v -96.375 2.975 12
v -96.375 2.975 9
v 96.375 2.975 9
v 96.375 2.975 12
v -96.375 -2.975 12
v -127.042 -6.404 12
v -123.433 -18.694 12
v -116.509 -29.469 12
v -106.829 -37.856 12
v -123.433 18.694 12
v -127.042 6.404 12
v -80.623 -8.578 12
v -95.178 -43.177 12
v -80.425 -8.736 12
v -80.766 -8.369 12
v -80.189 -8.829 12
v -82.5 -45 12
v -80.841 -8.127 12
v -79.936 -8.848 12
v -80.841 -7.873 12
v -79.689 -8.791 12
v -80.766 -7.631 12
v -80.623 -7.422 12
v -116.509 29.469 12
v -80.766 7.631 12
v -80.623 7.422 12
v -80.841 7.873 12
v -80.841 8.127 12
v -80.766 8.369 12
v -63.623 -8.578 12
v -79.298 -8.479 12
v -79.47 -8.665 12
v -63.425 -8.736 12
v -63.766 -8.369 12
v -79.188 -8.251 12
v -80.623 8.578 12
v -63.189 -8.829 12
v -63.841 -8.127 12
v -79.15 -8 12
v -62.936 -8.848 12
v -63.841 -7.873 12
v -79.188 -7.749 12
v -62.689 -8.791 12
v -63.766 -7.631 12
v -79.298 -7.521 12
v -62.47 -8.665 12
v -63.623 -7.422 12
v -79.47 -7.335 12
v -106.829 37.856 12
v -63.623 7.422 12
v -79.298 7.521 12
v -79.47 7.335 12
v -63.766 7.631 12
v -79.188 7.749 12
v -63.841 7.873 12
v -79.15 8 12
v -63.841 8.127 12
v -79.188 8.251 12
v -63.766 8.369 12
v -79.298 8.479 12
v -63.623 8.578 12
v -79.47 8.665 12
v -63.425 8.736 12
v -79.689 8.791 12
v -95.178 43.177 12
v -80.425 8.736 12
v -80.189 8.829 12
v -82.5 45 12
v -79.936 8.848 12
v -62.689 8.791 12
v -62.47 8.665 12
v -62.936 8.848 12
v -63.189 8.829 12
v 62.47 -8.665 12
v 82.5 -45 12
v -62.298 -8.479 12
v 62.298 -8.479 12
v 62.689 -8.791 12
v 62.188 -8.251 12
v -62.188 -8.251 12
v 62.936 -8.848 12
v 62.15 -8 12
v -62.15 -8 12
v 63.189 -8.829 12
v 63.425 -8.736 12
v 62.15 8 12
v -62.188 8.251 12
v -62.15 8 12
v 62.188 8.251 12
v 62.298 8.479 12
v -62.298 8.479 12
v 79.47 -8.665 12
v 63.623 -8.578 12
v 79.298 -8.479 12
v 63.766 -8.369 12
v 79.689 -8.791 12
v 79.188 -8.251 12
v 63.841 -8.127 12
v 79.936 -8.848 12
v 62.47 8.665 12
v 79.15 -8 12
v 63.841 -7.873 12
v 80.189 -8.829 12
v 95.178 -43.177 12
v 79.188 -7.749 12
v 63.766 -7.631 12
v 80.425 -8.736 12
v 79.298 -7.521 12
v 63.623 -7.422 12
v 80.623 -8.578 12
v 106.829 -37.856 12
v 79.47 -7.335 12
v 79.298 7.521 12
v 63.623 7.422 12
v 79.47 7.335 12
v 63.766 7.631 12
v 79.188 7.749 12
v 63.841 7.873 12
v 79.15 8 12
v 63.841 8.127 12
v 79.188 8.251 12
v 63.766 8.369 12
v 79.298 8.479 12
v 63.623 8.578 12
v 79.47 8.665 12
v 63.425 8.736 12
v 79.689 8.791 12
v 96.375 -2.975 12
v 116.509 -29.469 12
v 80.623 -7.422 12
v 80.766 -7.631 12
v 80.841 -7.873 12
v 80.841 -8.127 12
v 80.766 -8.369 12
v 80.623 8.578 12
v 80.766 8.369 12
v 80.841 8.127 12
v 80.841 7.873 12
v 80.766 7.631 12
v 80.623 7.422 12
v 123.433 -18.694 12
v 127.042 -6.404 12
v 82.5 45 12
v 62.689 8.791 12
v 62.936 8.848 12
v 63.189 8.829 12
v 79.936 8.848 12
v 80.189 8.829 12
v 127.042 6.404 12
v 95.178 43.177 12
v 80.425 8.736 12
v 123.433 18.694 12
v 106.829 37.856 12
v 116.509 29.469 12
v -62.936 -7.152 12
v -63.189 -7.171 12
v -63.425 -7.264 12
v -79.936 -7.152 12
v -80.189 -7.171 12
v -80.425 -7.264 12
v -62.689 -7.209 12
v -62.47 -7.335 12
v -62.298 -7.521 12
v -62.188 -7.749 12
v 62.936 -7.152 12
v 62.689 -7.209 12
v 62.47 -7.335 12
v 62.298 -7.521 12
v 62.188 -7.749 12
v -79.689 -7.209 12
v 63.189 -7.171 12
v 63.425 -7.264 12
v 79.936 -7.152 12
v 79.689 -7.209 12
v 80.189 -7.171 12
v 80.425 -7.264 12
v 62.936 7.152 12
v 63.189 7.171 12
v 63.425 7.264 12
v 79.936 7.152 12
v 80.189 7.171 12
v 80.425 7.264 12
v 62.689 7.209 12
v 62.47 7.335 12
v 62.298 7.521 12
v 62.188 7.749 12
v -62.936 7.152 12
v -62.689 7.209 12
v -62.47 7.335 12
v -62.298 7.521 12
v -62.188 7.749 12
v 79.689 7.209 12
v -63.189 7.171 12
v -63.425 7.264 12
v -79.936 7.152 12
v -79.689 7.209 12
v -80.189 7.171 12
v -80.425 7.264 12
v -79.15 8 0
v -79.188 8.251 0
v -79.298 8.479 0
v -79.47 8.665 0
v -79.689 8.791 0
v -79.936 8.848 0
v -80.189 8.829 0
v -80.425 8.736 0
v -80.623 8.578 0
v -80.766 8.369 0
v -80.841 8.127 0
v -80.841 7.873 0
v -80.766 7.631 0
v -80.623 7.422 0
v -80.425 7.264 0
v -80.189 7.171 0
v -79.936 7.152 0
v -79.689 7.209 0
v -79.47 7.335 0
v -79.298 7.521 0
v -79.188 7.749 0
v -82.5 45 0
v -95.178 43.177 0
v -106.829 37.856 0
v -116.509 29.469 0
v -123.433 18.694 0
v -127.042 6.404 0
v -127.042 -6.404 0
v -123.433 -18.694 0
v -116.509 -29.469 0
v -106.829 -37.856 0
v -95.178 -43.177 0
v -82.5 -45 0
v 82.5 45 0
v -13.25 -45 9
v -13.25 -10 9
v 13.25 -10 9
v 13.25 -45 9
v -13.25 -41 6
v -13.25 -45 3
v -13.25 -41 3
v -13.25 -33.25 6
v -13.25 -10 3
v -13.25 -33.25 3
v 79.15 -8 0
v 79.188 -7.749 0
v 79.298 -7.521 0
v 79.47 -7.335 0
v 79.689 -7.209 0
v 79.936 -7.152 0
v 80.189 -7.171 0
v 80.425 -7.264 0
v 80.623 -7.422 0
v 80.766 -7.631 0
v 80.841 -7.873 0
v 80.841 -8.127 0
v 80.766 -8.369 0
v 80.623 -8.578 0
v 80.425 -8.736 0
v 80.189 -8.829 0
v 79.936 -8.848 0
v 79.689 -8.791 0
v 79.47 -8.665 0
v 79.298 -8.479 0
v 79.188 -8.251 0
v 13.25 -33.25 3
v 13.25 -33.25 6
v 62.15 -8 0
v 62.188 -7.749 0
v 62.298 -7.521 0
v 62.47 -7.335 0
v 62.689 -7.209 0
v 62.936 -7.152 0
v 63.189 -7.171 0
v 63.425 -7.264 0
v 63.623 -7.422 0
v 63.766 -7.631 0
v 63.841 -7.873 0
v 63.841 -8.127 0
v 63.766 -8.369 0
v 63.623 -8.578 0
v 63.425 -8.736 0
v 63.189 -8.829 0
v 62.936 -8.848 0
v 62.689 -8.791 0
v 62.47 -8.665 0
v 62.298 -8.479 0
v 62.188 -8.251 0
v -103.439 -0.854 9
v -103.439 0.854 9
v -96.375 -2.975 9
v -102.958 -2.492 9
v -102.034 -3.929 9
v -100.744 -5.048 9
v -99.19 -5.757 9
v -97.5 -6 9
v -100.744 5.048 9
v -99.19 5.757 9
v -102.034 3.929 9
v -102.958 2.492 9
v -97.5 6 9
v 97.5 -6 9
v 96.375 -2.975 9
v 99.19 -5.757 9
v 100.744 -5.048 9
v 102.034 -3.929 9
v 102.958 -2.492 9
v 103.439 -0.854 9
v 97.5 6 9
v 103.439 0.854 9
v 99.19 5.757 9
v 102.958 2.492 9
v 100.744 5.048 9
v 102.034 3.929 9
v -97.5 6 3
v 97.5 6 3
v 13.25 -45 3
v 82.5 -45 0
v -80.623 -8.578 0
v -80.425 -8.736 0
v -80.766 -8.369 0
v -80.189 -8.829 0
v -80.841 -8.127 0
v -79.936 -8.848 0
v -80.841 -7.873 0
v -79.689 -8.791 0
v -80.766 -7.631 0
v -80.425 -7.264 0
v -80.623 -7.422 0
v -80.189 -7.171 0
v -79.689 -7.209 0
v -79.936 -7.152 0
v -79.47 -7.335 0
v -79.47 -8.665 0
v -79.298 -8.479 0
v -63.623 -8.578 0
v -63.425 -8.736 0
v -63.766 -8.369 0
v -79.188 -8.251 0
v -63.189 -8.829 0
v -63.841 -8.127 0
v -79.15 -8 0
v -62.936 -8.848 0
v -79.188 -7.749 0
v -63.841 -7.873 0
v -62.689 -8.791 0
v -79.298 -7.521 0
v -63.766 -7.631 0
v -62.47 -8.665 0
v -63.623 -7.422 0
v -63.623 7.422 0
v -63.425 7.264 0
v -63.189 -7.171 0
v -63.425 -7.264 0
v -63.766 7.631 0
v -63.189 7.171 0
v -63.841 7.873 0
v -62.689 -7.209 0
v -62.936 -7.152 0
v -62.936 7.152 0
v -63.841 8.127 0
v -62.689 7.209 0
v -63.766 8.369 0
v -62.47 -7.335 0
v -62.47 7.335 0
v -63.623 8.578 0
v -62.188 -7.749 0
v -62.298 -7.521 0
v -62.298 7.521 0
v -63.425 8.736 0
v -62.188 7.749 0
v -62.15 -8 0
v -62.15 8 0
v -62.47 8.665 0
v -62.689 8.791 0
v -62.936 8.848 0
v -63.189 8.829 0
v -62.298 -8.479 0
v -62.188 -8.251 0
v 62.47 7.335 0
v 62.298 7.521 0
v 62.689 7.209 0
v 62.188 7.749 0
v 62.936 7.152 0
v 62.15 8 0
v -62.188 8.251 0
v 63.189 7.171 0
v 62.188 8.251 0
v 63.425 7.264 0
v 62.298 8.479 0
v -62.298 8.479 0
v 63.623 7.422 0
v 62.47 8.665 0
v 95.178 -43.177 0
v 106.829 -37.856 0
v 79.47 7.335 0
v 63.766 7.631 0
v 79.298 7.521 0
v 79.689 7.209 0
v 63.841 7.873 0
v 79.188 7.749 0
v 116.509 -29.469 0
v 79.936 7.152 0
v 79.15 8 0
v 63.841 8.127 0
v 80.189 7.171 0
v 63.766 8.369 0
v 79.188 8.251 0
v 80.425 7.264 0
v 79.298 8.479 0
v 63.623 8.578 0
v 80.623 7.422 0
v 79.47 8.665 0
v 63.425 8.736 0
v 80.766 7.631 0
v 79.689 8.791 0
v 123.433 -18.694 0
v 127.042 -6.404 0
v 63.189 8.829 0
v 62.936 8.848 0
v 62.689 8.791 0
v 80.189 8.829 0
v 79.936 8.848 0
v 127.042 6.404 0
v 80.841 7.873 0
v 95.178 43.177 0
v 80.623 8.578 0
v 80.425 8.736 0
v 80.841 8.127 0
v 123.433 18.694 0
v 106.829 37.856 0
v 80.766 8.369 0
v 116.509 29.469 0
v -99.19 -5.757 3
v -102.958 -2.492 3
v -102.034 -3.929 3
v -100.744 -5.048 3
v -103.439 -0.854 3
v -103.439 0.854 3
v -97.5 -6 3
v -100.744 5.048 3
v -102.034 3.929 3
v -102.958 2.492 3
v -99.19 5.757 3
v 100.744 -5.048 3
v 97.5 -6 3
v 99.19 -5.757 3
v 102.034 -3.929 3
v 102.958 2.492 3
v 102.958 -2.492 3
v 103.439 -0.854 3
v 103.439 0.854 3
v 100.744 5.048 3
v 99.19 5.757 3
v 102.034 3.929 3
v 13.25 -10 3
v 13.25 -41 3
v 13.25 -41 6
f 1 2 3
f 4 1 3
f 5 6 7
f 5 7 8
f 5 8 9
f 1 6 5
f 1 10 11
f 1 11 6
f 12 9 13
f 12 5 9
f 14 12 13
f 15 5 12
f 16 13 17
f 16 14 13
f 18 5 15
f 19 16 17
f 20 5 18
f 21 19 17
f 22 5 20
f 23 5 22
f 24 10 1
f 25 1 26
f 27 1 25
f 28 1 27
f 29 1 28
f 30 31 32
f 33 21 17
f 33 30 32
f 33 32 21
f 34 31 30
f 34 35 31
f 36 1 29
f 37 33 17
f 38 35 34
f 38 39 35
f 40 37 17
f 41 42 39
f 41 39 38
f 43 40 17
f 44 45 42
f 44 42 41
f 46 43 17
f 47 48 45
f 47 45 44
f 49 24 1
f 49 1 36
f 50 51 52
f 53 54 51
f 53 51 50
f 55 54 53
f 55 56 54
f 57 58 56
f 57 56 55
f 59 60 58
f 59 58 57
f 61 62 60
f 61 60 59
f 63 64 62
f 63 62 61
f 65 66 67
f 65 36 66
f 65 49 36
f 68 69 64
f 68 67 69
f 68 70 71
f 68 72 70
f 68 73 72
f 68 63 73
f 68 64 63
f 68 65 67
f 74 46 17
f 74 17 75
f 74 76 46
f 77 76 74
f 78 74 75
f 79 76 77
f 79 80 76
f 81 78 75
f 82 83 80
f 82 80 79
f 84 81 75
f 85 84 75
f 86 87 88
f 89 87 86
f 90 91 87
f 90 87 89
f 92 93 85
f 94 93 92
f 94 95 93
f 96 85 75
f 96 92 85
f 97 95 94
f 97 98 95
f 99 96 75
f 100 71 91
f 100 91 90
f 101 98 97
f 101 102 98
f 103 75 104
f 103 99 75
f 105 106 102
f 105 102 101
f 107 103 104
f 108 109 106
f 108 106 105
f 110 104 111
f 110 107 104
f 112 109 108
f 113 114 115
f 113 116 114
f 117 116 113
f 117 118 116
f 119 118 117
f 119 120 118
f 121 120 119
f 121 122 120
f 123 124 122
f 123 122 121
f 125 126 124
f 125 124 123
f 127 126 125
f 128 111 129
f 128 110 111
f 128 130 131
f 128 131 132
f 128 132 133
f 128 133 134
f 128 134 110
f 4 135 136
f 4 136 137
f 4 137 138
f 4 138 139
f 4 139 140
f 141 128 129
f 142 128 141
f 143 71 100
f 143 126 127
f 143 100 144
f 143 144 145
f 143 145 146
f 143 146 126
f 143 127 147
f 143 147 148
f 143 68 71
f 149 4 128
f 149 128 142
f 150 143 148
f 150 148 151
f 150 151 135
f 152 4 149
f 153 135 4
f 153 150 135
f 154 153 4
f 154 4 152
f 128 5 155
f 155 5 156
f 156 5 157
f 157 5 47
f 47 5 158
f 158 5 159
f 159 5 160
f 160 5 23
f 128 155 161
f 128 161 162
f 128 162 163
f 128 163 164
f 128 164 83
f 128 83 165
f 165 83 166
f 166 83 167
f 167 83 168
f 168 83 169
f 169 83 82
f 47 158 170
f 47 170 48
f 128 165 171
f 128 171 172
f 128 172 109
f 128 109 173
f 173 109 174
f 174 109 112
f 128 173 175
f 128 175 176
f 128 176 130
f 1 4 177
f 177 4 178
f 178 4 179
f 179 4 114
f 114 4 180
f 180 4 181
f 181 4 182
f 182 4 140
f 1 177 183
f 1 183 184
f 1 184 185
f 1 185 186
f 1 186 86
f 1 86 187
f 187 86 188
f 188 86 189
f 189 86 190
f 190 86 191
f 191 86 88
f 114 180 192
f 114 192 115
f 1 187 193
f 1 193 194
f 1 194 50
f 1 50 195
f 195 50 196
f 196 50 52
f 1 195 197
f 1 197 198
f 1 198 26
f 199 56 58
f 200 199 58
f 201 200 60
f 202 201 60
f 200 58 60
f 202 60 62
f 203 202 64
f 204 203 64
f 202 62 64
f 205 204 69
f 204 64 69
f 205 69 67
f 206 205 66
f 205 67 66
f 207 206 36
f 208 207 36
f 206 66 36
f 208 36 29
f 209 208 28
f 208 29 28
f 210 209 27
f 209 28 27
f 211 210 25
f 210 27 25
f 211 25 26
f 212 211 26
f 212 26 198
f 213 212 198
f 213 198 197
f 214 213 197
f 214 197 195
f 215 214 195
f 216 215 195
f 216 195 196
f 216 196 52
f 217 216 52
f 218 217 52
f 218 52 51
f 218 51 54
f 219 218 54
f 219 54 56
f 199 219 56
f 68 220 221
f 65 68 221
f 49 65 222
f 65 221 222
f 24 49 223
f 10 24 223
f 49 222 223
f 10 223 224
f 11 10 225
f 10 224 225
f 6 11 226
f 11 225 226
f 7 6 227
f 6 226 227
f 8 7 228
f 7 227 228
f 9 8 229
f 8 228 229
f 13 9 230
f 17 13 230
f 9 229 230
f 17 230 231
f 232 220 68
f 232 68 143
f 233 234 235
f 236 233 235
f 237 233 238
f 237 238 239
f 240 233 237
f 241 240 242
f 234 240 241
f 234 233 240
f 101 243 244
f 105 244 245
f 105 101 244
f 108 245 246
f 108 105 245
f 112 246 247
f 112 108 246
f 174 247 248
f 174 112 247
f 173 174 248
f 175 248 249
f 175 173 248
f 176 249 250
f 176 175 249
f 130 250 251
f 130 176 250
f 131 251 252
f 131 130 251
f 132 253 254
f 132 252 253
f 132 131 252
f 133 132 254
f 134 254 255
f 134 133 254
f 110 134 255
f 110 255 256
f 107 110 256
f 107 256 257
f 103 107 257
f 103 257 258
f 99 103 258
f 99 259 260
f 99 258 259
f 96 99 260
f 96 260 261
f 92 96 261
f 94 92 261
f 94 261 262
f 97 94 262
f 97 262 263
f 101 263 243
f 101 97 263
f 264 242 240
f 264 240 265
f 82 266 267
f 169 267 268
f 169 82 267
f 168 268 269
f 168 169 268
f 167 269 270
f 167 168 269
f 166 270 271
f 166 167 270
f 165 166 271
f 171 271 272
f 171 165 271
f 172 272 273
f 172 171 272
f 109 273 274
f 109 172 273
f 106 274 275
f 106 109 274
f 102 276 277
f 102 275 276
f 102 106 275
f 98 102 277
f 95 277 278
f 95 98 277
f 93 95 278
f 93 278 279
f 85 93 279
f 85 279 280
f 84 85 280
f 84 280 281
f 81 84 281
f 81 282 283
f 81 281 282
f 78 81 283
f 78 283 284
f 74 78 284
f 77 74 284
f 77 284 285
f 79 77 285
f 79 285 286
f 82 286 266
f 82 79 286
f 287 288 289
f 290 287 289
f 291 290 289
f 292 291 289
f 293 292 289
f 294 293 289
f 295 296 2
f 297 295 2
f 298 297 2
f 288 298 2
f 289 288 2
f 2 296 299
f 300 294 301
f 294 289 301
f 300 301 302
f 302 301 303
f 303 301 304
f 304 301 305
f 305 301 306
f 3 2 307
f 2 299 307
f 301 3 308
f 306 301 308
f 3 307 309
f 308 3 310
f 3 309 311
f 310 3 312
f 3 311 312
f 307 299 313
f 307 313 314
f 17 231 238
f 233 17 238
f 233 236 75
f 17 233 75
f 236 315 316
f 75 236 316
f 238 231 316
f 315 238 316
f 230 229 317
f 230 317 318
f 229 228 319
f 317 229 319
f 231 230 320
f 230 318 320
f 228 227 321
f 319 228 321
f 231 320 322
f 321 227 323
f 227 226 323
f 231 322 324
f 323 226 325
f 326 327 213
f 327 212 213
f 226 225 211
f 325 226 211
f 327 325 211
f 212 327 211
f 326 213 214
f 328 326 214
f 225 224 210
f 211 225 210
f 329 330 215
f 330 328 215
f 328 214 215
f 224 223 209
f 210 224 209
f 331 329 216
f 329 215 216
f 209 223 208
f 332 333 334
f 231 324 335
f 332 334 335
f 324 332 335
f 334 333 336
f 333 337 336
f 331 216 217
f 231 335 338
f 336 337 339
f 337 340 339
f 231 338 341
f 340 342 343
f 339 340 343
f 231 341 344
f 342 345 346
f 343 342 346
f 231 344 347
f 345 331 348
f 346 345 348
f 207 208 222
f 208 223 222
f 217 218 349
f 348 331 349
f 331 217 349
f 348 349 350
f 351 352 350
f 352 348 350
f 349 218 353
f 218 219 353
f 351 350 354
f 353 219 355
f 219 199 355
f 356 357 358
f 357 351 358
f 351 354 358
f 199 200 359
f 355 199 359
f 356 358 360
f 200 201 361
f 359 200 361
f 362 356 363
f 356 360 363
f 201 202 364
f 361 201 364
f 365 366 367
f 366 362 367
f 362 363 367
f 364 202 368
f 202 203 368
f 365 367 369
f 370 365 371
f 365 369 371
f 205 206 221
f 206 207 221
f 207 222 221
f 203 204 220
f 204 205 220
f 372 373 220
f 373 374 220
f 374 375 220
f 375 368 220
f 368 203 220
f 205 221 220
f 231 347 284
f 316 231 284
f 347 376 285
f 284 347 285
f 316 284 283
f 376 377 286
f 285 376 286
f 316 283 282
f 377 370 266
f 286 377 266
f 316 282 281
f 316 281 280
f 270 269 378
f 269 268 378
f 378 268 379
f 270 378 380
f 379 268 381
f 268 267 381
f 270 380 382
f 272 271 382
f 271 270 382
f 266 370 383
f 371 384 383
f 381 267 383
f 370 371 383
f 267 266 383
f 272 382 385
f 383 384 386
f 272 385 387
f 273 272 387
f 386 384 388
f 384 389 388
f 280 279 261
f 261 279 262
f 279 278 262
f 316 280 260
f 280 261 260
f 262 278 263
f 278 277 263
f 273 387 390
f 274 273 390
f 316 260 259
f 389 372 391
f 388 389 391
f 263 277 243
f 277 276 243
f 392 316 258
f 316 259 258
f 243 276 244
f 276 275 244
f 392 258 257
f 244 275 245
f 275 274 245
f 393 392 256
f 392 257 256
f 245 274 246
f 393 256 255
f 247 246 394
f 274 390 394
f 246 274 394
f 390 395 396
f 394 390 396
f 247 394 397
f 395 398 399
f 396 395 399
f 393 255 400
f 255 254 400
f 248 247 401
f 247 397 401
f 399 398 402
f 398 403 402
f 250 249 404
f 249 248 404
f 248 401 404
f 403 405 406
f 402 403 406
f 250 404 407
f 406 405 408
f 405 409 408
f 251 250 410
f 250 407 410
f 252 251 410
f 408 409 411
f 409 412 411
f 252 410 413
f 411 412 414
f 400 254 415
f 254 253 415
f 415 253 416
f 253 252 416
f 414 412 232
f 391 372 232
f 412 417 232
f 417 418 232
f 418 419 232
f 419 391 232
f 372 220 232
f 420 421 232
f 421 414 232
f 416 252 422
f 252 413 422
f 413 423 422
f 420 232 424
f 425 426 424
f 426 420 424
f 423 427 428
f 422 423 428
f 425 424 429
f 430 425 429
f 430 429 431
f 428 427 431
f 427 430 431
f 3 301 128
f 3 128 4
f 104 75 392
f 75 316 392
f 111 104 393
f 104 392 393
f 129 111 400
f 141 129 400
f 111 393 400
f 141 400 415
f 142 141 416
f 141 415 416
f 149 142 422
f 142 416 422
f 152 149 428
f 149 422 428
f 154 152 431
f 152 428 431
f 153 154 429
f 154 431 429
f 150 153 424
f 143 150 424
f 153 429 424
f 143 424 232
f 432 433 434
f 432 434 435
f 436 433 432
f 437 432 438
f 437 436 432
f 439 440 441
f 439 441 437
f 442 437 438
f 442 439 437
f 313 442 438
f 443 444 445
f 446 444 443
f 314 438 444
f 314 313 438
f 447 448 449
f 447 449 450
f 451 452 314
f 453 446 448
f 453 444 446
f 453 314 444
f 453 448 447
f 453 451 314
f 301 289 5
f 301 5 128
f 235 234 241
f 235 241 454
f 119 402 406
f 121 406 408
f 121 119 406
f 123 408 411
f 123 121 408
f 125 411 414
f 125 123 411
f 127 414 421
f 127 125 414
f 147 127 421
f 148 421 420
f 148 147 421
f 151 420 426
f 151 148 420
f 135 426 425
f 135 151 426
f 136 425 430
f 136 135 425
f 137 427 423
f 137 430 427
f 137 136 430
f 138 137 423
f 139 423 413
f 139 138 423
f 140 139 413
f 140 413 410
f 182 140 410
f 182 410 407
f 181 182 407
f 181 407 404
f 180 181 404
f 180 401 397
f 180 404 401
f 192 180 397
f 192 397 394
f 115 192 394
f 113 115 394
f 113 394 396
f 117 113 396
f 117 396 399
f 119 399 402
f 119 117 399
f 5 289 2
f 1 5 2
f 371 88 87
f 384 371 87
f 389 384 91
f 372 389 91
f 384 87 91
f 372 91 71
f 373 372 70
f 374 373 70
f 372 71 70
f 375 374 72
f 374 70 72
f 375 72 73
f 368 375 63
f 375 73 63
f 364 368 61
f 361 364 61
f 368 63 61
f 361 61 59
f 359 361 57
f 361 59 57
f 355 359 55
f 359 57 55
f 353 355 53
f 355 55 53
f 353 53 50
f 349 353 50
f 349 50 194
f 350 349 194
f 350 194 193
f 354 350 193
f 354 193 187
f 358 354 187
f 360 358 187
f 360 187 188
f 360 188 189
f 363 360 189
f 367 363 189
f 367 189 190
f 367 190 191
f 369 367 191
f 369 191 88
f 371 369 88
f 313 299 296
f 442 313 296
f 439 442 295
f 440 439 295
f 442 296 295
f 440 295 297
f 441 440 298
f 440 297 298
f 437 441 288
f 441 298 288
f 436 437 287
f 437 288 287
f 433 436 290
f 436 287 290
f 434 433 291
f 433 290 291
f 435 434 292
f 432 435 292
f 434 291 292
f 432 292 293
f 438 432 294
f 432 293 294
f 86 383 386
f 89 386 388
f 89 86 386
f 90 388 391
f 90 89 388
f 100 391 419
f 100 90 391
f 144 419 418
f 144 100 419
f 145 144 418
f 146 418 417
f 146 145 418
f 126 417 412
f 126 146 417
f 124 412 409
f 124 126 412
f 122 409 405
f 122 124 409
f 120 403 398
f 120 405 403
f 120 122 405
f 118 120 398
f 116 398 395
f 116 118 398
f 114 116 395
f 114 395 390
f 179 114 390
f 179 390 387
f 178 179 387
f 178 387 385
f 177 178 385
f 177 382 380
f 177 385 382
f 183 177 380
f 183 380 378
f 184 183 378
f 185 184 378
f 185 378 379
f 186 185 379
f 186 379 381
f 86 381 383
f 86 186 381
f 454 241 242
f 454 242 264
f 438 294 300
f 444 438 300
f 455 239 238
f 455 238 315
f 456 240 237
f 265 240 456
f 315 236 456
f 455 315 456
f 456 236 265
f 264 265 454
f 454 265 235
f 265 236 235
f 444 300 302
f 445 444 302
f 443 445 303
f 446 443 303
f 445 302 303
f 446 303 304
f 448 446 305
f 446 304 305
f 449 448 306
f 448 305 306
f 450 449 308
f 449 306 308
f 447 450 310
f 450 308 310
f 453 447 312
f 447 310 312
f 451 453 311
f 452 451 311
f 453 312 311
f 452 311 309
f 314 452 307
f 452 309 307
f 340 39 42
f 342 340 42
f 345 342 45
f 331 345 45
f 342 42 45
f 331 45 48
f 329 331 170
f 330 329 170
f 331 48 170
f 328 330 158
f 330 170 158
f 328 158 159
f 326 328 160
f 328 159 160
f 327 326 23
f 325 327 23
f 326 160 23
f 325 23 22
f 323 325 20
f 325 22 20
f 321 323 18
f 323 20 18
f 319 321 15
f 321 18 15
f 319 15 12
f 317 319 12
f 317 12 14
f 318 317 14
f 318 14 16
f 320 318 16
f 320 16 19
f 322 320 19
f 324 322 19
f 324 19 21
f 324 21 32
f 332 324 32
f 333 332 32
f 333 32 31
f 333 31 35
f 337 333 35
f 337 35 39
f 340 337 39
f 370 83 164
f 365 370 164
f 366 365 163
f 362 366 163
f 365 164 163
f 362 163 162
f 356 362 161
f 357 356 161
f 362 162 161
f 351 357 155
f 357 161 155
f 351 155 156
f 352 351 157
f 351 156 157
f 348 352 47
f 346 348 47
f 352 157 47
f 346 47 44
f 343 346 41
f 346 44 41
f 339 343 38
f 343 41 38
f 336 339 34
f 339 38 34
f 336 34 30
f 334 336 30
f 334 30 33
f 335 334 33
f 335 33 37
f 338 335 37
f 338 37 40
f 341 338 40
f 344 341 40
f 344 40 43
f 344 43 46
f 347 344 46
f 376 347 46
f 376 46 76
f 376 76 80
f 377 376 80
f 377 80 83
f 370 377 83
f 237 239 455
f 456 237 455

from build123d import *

# Parameters (mm, degrees)
PAD_DEPTH       = 9
POCKET_DEPTH    = 6
SKETCH002_W     = 26.5
SKETCH002_H     = 35
POCKET001_DEPTH = 6
SKETCH003_W     = 192.75
SKETCH003_H     = 5.95
PAD001_DEPTH    = 3
SKETCH004_R     = 0.85
POCKET002_DEPTH = 553.365942
SKETCH005_W     = 26.5
SKETCH005_H     = 7.75
PAD002_DEPTH    = 3


with BuildPart() as part:
    # Sketch → Pad (new body)
    with BuildSketch(Plane.XY):
        with BuildLine():
            ThreePointArc((-82.5, 45), (-127.5, 0), (-82.5, -45))
            Line((-82.5, -45), (82.5, -45))
            ThreePointArc((82.5, -45), (127.5, 0), (82.5, 45))
            Line((-82.5, 45), (82.5, 45))
        make_face()
    extrude(amount=PAD_DEPTH)

    # Sketch001 (on Face6 of Pad) → Pocket (cut)
    with BuildSketch(Plane.XY.offset(9)):
        with BuildLine():
            ThreePointArc((-97.5, 6), (-103.5, 0), (-97.5, -6))
            Line((-97.5, -6), (97.5, -6))
            ThreePointArc((97.5, -6), (103.5, 0), (97.5, 6))
            Line((-97.5, 6), (97.5, 6))
        make_face()
    extrude(amount=-POCKET_DEPTH, mode=Mode.SUBTRACT)

    # Sketch002 (on Face5 of Pocket) → Pocket001 (cut)
    with BuildSketch(Plane.XY.offset(9)):
        with Locations((0, -27.5)):
            Rectangle(SKETCH002_W, SKETCH002_H)
    extrude(amount=-POCKET001_DEPTH, mode=Mode.SUBTRACT)

    # Sketch003 (on Face5 of Pocket001) → Pad001 (join)
    with BuildSketch(Plane.XY.offset(9)):
        with BuildLine():
            ThreePointArc((-82.5, 45), (-127.5, 0), (-82.5, -45))
            Line((-82.5, -45), (82.5, -45))
            ThreePointArc((82.5, -45), (127.5, 0), (82.5, 45))
            Line((-82.5, 45), (82.5, 45))
        make_face()
        Rectangle(SKETCH003_W, SKETCH003_H, mode=Mode.SUBTRACT)
    extrude(amount=PAD001_DEPTH)

    # Sketch004 (on Face12 of Pad001) → Pocket002 (cut, through all)
    with BuildSketch(Plane.XY.offset(12)):
        with Locations((-80, -8)):
            Circle(SKETCH004_R)
        with Locations((-63, -8)):
            Circle(SKETCH004_R)
        with Locations((-63, 8)):
            Circle(SKETCH004_R)
        with Locations((-80, 8)):
            Circle(SKETCH004_R)
    pocket002 = extrude(amount=-POCKET002_DEPTH, mode=Mode.SUBTRACT)

    # Sketch005 (on Face10 of Pocket002) → Pad002 (join)
    with BuildSketch(Plane.XY.offset(3)):
        with Locations((0, -37.125)):
            Rectangle(SKETCH005_W, SKETCH005_H)
    extrude(amount=PAD002_DEPTH)

    # Mirrored: Pocket002 across Sketch004 V_Axis
    add(pocket002.mirror(Plane(origin=(0, 0, 12), x_dir=(0, 0, 1), z_dir=(1, 0, 0))), mode=Mode.SUBTRACT)


solid = part.part
